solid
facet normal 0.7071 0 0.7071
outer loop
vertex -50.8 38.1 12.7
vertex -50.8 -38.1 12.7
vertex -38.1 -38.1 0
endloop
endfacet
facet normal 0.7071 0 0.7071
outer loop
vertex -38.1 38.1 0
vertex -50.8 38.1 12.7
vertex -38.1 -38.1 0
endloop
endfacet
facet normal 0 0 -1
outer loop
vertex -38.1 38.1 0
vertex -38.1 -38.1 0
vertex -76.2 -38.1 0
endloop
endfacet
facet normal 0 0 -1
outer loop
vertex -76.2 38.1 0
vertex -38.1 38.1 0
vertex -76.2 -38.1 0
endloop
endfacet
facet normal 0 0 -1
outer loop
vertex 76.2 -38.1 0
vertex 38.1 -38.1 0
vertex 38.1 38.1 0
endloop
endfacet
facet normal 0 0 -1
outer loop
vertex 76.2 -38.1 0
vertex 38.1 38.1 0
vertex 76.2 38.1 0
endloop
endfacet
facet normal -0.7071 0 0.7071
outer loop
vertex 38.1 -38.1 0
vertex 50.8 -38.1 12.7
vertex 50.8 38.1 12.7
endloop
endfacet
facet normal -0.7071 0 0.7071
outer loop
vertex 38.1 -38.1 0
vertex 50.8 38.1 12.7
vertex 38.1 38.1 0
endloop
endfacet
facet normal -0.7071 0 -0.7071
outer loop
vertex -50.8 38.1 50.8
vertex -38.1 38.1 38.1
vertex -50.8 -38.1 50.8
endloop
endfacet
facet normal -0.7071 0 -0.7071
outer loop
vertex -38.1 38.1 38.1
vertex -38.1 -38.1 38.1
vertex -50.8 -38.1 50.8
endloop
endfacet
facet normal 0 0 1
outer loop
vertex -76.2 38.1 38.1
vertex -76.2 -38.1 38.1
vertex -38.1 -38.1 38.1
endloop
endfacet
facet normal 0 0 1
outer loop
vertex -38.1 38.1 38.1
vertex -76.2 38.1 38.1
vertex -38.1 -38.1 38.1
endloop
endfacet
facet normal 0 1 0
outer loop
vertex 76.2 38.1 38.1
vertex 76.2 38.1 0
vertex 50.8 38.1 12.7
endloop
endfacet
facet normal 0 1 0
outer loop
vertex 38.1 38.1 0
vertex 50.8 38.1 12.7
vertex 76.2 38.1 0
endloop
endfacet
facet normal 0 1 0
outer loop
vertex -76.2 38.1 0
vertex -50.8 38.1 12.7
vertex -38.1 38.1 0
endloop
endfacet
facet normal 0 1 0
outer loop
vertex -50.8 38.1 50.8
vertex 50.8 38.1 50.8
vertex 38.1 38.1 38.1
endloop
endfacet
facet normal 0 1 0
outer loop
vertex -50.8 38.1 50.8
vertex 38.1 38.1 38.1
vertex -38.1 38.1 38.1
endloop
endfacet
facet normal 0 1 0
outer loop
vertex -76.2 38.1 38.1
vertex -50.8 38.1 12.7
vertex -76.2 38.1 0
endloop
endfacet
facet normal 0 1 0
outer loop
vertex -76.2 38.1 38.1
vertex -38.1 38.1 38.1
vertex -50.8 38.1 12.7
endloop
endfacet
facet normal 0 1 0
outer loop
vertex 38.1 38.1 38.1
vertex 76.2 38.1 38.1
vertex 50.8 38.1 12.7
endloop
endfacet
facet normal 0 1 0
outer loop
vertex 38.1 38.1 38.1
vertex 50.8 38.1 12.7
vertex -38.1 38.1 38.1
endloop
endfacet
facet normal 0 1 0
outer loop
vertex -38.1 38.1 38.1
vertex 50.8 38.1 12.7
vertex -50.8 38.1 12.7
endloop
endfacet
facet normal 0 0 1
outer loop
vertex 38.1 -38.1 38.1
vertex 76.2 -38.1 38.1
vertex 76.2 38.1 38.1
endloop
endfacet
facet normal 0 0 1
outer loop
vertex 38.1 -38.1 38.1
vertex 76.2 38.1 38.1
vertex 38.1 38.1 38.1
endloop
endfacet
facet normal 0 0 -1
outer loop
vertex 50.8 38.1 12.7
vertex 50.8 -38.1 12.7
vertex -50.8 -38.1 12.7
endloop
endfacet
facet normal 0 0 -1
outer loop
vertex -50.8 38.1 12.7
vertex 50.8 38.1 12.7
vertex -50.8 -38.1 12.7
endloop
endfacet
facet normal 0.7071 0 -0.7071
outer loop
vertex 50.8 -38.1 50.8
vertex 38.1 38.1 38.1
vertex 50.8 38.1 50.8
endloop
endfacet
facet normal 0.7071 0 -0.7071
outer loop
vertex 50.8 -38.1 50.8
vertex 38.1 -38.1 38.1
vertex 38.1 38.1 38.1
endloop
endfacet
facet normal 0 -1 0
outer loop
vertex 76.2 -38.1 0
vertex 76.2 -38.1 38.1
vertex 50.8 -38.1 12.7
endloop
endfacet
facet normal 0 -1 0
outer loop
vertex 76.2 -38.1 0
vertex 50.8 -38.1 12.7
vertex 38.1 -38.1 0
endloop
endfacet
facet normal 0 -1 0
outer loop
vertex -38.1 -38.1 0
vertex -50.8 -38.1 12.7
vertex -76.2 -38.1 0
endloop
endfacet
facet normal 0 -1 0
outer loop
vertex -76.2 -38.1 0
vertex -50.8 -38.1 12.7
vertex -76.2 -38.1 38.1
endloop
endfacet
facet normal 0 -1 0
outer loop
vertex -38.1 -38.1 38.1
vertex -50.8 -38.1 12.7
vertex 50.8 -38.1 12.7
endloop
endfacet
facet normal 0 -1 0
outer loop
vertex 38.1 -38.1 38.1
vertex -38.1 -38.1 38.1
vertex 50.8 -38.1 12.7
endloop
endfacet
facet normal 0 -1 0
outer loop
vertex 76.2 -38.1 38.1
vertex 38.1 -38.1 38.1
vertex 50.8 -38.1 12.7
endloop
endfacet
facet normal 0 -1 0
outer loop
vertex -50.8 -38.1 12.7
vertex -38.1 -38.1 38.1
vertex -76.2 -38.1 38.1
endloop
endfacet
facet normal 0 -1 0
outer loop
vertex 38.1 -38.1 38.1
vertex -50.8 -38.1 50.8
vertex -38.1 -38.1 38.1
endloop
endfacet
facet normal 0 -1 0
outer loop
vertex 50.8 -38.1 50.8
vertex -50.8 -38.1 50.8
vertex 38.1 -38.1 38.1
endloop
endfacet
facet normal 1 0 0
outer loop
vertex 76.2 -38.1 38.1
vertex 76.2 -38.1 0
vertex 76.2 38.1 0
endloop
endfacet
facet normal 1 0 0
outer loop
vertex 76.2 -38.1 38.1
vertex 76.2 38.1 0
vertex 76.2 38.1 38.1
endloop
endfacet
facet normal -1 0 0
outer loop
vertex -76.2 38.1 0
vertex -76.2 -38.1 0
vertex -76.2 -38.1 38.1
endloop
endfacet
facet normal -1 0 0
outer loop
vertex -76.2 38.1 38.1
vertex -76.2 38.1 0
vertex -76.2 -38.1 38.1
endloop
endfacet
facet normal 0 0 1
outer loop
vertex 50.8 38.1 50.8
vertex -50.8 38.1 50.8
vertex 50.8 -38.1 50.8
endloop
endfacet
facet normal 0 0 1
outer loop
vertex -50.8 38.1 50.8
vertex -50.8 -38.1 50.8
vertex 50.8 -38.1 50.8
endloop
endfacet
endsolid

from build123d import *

# Parameters (mm, degrees)
F1_DEPTH = 38.1


with BuildPart() as f1:
    # F0 (on Front) → F1 (new body, symmetric)
    with BuildSketch(Plane.XZ):
        Polygon((0, 50.8), (0, 12.7), (50.8, 12.7), (38.1, 0), (76.2, 0), (76.2, 38.1), (38.1, 38.1), (50.8, 50.8), align=None)
    extrude(amount=F1_DEPTH, both=True)

    # F2: F1 across face


with BuildPart() as f1_1:
    add(f1.part)
    add(f1.part.mirror(Plane(origin=(0, 0, 31.75), x_dir=(0, -1, 0), z_dir=(-1, 0, 0))))


solid = f1_1.part
